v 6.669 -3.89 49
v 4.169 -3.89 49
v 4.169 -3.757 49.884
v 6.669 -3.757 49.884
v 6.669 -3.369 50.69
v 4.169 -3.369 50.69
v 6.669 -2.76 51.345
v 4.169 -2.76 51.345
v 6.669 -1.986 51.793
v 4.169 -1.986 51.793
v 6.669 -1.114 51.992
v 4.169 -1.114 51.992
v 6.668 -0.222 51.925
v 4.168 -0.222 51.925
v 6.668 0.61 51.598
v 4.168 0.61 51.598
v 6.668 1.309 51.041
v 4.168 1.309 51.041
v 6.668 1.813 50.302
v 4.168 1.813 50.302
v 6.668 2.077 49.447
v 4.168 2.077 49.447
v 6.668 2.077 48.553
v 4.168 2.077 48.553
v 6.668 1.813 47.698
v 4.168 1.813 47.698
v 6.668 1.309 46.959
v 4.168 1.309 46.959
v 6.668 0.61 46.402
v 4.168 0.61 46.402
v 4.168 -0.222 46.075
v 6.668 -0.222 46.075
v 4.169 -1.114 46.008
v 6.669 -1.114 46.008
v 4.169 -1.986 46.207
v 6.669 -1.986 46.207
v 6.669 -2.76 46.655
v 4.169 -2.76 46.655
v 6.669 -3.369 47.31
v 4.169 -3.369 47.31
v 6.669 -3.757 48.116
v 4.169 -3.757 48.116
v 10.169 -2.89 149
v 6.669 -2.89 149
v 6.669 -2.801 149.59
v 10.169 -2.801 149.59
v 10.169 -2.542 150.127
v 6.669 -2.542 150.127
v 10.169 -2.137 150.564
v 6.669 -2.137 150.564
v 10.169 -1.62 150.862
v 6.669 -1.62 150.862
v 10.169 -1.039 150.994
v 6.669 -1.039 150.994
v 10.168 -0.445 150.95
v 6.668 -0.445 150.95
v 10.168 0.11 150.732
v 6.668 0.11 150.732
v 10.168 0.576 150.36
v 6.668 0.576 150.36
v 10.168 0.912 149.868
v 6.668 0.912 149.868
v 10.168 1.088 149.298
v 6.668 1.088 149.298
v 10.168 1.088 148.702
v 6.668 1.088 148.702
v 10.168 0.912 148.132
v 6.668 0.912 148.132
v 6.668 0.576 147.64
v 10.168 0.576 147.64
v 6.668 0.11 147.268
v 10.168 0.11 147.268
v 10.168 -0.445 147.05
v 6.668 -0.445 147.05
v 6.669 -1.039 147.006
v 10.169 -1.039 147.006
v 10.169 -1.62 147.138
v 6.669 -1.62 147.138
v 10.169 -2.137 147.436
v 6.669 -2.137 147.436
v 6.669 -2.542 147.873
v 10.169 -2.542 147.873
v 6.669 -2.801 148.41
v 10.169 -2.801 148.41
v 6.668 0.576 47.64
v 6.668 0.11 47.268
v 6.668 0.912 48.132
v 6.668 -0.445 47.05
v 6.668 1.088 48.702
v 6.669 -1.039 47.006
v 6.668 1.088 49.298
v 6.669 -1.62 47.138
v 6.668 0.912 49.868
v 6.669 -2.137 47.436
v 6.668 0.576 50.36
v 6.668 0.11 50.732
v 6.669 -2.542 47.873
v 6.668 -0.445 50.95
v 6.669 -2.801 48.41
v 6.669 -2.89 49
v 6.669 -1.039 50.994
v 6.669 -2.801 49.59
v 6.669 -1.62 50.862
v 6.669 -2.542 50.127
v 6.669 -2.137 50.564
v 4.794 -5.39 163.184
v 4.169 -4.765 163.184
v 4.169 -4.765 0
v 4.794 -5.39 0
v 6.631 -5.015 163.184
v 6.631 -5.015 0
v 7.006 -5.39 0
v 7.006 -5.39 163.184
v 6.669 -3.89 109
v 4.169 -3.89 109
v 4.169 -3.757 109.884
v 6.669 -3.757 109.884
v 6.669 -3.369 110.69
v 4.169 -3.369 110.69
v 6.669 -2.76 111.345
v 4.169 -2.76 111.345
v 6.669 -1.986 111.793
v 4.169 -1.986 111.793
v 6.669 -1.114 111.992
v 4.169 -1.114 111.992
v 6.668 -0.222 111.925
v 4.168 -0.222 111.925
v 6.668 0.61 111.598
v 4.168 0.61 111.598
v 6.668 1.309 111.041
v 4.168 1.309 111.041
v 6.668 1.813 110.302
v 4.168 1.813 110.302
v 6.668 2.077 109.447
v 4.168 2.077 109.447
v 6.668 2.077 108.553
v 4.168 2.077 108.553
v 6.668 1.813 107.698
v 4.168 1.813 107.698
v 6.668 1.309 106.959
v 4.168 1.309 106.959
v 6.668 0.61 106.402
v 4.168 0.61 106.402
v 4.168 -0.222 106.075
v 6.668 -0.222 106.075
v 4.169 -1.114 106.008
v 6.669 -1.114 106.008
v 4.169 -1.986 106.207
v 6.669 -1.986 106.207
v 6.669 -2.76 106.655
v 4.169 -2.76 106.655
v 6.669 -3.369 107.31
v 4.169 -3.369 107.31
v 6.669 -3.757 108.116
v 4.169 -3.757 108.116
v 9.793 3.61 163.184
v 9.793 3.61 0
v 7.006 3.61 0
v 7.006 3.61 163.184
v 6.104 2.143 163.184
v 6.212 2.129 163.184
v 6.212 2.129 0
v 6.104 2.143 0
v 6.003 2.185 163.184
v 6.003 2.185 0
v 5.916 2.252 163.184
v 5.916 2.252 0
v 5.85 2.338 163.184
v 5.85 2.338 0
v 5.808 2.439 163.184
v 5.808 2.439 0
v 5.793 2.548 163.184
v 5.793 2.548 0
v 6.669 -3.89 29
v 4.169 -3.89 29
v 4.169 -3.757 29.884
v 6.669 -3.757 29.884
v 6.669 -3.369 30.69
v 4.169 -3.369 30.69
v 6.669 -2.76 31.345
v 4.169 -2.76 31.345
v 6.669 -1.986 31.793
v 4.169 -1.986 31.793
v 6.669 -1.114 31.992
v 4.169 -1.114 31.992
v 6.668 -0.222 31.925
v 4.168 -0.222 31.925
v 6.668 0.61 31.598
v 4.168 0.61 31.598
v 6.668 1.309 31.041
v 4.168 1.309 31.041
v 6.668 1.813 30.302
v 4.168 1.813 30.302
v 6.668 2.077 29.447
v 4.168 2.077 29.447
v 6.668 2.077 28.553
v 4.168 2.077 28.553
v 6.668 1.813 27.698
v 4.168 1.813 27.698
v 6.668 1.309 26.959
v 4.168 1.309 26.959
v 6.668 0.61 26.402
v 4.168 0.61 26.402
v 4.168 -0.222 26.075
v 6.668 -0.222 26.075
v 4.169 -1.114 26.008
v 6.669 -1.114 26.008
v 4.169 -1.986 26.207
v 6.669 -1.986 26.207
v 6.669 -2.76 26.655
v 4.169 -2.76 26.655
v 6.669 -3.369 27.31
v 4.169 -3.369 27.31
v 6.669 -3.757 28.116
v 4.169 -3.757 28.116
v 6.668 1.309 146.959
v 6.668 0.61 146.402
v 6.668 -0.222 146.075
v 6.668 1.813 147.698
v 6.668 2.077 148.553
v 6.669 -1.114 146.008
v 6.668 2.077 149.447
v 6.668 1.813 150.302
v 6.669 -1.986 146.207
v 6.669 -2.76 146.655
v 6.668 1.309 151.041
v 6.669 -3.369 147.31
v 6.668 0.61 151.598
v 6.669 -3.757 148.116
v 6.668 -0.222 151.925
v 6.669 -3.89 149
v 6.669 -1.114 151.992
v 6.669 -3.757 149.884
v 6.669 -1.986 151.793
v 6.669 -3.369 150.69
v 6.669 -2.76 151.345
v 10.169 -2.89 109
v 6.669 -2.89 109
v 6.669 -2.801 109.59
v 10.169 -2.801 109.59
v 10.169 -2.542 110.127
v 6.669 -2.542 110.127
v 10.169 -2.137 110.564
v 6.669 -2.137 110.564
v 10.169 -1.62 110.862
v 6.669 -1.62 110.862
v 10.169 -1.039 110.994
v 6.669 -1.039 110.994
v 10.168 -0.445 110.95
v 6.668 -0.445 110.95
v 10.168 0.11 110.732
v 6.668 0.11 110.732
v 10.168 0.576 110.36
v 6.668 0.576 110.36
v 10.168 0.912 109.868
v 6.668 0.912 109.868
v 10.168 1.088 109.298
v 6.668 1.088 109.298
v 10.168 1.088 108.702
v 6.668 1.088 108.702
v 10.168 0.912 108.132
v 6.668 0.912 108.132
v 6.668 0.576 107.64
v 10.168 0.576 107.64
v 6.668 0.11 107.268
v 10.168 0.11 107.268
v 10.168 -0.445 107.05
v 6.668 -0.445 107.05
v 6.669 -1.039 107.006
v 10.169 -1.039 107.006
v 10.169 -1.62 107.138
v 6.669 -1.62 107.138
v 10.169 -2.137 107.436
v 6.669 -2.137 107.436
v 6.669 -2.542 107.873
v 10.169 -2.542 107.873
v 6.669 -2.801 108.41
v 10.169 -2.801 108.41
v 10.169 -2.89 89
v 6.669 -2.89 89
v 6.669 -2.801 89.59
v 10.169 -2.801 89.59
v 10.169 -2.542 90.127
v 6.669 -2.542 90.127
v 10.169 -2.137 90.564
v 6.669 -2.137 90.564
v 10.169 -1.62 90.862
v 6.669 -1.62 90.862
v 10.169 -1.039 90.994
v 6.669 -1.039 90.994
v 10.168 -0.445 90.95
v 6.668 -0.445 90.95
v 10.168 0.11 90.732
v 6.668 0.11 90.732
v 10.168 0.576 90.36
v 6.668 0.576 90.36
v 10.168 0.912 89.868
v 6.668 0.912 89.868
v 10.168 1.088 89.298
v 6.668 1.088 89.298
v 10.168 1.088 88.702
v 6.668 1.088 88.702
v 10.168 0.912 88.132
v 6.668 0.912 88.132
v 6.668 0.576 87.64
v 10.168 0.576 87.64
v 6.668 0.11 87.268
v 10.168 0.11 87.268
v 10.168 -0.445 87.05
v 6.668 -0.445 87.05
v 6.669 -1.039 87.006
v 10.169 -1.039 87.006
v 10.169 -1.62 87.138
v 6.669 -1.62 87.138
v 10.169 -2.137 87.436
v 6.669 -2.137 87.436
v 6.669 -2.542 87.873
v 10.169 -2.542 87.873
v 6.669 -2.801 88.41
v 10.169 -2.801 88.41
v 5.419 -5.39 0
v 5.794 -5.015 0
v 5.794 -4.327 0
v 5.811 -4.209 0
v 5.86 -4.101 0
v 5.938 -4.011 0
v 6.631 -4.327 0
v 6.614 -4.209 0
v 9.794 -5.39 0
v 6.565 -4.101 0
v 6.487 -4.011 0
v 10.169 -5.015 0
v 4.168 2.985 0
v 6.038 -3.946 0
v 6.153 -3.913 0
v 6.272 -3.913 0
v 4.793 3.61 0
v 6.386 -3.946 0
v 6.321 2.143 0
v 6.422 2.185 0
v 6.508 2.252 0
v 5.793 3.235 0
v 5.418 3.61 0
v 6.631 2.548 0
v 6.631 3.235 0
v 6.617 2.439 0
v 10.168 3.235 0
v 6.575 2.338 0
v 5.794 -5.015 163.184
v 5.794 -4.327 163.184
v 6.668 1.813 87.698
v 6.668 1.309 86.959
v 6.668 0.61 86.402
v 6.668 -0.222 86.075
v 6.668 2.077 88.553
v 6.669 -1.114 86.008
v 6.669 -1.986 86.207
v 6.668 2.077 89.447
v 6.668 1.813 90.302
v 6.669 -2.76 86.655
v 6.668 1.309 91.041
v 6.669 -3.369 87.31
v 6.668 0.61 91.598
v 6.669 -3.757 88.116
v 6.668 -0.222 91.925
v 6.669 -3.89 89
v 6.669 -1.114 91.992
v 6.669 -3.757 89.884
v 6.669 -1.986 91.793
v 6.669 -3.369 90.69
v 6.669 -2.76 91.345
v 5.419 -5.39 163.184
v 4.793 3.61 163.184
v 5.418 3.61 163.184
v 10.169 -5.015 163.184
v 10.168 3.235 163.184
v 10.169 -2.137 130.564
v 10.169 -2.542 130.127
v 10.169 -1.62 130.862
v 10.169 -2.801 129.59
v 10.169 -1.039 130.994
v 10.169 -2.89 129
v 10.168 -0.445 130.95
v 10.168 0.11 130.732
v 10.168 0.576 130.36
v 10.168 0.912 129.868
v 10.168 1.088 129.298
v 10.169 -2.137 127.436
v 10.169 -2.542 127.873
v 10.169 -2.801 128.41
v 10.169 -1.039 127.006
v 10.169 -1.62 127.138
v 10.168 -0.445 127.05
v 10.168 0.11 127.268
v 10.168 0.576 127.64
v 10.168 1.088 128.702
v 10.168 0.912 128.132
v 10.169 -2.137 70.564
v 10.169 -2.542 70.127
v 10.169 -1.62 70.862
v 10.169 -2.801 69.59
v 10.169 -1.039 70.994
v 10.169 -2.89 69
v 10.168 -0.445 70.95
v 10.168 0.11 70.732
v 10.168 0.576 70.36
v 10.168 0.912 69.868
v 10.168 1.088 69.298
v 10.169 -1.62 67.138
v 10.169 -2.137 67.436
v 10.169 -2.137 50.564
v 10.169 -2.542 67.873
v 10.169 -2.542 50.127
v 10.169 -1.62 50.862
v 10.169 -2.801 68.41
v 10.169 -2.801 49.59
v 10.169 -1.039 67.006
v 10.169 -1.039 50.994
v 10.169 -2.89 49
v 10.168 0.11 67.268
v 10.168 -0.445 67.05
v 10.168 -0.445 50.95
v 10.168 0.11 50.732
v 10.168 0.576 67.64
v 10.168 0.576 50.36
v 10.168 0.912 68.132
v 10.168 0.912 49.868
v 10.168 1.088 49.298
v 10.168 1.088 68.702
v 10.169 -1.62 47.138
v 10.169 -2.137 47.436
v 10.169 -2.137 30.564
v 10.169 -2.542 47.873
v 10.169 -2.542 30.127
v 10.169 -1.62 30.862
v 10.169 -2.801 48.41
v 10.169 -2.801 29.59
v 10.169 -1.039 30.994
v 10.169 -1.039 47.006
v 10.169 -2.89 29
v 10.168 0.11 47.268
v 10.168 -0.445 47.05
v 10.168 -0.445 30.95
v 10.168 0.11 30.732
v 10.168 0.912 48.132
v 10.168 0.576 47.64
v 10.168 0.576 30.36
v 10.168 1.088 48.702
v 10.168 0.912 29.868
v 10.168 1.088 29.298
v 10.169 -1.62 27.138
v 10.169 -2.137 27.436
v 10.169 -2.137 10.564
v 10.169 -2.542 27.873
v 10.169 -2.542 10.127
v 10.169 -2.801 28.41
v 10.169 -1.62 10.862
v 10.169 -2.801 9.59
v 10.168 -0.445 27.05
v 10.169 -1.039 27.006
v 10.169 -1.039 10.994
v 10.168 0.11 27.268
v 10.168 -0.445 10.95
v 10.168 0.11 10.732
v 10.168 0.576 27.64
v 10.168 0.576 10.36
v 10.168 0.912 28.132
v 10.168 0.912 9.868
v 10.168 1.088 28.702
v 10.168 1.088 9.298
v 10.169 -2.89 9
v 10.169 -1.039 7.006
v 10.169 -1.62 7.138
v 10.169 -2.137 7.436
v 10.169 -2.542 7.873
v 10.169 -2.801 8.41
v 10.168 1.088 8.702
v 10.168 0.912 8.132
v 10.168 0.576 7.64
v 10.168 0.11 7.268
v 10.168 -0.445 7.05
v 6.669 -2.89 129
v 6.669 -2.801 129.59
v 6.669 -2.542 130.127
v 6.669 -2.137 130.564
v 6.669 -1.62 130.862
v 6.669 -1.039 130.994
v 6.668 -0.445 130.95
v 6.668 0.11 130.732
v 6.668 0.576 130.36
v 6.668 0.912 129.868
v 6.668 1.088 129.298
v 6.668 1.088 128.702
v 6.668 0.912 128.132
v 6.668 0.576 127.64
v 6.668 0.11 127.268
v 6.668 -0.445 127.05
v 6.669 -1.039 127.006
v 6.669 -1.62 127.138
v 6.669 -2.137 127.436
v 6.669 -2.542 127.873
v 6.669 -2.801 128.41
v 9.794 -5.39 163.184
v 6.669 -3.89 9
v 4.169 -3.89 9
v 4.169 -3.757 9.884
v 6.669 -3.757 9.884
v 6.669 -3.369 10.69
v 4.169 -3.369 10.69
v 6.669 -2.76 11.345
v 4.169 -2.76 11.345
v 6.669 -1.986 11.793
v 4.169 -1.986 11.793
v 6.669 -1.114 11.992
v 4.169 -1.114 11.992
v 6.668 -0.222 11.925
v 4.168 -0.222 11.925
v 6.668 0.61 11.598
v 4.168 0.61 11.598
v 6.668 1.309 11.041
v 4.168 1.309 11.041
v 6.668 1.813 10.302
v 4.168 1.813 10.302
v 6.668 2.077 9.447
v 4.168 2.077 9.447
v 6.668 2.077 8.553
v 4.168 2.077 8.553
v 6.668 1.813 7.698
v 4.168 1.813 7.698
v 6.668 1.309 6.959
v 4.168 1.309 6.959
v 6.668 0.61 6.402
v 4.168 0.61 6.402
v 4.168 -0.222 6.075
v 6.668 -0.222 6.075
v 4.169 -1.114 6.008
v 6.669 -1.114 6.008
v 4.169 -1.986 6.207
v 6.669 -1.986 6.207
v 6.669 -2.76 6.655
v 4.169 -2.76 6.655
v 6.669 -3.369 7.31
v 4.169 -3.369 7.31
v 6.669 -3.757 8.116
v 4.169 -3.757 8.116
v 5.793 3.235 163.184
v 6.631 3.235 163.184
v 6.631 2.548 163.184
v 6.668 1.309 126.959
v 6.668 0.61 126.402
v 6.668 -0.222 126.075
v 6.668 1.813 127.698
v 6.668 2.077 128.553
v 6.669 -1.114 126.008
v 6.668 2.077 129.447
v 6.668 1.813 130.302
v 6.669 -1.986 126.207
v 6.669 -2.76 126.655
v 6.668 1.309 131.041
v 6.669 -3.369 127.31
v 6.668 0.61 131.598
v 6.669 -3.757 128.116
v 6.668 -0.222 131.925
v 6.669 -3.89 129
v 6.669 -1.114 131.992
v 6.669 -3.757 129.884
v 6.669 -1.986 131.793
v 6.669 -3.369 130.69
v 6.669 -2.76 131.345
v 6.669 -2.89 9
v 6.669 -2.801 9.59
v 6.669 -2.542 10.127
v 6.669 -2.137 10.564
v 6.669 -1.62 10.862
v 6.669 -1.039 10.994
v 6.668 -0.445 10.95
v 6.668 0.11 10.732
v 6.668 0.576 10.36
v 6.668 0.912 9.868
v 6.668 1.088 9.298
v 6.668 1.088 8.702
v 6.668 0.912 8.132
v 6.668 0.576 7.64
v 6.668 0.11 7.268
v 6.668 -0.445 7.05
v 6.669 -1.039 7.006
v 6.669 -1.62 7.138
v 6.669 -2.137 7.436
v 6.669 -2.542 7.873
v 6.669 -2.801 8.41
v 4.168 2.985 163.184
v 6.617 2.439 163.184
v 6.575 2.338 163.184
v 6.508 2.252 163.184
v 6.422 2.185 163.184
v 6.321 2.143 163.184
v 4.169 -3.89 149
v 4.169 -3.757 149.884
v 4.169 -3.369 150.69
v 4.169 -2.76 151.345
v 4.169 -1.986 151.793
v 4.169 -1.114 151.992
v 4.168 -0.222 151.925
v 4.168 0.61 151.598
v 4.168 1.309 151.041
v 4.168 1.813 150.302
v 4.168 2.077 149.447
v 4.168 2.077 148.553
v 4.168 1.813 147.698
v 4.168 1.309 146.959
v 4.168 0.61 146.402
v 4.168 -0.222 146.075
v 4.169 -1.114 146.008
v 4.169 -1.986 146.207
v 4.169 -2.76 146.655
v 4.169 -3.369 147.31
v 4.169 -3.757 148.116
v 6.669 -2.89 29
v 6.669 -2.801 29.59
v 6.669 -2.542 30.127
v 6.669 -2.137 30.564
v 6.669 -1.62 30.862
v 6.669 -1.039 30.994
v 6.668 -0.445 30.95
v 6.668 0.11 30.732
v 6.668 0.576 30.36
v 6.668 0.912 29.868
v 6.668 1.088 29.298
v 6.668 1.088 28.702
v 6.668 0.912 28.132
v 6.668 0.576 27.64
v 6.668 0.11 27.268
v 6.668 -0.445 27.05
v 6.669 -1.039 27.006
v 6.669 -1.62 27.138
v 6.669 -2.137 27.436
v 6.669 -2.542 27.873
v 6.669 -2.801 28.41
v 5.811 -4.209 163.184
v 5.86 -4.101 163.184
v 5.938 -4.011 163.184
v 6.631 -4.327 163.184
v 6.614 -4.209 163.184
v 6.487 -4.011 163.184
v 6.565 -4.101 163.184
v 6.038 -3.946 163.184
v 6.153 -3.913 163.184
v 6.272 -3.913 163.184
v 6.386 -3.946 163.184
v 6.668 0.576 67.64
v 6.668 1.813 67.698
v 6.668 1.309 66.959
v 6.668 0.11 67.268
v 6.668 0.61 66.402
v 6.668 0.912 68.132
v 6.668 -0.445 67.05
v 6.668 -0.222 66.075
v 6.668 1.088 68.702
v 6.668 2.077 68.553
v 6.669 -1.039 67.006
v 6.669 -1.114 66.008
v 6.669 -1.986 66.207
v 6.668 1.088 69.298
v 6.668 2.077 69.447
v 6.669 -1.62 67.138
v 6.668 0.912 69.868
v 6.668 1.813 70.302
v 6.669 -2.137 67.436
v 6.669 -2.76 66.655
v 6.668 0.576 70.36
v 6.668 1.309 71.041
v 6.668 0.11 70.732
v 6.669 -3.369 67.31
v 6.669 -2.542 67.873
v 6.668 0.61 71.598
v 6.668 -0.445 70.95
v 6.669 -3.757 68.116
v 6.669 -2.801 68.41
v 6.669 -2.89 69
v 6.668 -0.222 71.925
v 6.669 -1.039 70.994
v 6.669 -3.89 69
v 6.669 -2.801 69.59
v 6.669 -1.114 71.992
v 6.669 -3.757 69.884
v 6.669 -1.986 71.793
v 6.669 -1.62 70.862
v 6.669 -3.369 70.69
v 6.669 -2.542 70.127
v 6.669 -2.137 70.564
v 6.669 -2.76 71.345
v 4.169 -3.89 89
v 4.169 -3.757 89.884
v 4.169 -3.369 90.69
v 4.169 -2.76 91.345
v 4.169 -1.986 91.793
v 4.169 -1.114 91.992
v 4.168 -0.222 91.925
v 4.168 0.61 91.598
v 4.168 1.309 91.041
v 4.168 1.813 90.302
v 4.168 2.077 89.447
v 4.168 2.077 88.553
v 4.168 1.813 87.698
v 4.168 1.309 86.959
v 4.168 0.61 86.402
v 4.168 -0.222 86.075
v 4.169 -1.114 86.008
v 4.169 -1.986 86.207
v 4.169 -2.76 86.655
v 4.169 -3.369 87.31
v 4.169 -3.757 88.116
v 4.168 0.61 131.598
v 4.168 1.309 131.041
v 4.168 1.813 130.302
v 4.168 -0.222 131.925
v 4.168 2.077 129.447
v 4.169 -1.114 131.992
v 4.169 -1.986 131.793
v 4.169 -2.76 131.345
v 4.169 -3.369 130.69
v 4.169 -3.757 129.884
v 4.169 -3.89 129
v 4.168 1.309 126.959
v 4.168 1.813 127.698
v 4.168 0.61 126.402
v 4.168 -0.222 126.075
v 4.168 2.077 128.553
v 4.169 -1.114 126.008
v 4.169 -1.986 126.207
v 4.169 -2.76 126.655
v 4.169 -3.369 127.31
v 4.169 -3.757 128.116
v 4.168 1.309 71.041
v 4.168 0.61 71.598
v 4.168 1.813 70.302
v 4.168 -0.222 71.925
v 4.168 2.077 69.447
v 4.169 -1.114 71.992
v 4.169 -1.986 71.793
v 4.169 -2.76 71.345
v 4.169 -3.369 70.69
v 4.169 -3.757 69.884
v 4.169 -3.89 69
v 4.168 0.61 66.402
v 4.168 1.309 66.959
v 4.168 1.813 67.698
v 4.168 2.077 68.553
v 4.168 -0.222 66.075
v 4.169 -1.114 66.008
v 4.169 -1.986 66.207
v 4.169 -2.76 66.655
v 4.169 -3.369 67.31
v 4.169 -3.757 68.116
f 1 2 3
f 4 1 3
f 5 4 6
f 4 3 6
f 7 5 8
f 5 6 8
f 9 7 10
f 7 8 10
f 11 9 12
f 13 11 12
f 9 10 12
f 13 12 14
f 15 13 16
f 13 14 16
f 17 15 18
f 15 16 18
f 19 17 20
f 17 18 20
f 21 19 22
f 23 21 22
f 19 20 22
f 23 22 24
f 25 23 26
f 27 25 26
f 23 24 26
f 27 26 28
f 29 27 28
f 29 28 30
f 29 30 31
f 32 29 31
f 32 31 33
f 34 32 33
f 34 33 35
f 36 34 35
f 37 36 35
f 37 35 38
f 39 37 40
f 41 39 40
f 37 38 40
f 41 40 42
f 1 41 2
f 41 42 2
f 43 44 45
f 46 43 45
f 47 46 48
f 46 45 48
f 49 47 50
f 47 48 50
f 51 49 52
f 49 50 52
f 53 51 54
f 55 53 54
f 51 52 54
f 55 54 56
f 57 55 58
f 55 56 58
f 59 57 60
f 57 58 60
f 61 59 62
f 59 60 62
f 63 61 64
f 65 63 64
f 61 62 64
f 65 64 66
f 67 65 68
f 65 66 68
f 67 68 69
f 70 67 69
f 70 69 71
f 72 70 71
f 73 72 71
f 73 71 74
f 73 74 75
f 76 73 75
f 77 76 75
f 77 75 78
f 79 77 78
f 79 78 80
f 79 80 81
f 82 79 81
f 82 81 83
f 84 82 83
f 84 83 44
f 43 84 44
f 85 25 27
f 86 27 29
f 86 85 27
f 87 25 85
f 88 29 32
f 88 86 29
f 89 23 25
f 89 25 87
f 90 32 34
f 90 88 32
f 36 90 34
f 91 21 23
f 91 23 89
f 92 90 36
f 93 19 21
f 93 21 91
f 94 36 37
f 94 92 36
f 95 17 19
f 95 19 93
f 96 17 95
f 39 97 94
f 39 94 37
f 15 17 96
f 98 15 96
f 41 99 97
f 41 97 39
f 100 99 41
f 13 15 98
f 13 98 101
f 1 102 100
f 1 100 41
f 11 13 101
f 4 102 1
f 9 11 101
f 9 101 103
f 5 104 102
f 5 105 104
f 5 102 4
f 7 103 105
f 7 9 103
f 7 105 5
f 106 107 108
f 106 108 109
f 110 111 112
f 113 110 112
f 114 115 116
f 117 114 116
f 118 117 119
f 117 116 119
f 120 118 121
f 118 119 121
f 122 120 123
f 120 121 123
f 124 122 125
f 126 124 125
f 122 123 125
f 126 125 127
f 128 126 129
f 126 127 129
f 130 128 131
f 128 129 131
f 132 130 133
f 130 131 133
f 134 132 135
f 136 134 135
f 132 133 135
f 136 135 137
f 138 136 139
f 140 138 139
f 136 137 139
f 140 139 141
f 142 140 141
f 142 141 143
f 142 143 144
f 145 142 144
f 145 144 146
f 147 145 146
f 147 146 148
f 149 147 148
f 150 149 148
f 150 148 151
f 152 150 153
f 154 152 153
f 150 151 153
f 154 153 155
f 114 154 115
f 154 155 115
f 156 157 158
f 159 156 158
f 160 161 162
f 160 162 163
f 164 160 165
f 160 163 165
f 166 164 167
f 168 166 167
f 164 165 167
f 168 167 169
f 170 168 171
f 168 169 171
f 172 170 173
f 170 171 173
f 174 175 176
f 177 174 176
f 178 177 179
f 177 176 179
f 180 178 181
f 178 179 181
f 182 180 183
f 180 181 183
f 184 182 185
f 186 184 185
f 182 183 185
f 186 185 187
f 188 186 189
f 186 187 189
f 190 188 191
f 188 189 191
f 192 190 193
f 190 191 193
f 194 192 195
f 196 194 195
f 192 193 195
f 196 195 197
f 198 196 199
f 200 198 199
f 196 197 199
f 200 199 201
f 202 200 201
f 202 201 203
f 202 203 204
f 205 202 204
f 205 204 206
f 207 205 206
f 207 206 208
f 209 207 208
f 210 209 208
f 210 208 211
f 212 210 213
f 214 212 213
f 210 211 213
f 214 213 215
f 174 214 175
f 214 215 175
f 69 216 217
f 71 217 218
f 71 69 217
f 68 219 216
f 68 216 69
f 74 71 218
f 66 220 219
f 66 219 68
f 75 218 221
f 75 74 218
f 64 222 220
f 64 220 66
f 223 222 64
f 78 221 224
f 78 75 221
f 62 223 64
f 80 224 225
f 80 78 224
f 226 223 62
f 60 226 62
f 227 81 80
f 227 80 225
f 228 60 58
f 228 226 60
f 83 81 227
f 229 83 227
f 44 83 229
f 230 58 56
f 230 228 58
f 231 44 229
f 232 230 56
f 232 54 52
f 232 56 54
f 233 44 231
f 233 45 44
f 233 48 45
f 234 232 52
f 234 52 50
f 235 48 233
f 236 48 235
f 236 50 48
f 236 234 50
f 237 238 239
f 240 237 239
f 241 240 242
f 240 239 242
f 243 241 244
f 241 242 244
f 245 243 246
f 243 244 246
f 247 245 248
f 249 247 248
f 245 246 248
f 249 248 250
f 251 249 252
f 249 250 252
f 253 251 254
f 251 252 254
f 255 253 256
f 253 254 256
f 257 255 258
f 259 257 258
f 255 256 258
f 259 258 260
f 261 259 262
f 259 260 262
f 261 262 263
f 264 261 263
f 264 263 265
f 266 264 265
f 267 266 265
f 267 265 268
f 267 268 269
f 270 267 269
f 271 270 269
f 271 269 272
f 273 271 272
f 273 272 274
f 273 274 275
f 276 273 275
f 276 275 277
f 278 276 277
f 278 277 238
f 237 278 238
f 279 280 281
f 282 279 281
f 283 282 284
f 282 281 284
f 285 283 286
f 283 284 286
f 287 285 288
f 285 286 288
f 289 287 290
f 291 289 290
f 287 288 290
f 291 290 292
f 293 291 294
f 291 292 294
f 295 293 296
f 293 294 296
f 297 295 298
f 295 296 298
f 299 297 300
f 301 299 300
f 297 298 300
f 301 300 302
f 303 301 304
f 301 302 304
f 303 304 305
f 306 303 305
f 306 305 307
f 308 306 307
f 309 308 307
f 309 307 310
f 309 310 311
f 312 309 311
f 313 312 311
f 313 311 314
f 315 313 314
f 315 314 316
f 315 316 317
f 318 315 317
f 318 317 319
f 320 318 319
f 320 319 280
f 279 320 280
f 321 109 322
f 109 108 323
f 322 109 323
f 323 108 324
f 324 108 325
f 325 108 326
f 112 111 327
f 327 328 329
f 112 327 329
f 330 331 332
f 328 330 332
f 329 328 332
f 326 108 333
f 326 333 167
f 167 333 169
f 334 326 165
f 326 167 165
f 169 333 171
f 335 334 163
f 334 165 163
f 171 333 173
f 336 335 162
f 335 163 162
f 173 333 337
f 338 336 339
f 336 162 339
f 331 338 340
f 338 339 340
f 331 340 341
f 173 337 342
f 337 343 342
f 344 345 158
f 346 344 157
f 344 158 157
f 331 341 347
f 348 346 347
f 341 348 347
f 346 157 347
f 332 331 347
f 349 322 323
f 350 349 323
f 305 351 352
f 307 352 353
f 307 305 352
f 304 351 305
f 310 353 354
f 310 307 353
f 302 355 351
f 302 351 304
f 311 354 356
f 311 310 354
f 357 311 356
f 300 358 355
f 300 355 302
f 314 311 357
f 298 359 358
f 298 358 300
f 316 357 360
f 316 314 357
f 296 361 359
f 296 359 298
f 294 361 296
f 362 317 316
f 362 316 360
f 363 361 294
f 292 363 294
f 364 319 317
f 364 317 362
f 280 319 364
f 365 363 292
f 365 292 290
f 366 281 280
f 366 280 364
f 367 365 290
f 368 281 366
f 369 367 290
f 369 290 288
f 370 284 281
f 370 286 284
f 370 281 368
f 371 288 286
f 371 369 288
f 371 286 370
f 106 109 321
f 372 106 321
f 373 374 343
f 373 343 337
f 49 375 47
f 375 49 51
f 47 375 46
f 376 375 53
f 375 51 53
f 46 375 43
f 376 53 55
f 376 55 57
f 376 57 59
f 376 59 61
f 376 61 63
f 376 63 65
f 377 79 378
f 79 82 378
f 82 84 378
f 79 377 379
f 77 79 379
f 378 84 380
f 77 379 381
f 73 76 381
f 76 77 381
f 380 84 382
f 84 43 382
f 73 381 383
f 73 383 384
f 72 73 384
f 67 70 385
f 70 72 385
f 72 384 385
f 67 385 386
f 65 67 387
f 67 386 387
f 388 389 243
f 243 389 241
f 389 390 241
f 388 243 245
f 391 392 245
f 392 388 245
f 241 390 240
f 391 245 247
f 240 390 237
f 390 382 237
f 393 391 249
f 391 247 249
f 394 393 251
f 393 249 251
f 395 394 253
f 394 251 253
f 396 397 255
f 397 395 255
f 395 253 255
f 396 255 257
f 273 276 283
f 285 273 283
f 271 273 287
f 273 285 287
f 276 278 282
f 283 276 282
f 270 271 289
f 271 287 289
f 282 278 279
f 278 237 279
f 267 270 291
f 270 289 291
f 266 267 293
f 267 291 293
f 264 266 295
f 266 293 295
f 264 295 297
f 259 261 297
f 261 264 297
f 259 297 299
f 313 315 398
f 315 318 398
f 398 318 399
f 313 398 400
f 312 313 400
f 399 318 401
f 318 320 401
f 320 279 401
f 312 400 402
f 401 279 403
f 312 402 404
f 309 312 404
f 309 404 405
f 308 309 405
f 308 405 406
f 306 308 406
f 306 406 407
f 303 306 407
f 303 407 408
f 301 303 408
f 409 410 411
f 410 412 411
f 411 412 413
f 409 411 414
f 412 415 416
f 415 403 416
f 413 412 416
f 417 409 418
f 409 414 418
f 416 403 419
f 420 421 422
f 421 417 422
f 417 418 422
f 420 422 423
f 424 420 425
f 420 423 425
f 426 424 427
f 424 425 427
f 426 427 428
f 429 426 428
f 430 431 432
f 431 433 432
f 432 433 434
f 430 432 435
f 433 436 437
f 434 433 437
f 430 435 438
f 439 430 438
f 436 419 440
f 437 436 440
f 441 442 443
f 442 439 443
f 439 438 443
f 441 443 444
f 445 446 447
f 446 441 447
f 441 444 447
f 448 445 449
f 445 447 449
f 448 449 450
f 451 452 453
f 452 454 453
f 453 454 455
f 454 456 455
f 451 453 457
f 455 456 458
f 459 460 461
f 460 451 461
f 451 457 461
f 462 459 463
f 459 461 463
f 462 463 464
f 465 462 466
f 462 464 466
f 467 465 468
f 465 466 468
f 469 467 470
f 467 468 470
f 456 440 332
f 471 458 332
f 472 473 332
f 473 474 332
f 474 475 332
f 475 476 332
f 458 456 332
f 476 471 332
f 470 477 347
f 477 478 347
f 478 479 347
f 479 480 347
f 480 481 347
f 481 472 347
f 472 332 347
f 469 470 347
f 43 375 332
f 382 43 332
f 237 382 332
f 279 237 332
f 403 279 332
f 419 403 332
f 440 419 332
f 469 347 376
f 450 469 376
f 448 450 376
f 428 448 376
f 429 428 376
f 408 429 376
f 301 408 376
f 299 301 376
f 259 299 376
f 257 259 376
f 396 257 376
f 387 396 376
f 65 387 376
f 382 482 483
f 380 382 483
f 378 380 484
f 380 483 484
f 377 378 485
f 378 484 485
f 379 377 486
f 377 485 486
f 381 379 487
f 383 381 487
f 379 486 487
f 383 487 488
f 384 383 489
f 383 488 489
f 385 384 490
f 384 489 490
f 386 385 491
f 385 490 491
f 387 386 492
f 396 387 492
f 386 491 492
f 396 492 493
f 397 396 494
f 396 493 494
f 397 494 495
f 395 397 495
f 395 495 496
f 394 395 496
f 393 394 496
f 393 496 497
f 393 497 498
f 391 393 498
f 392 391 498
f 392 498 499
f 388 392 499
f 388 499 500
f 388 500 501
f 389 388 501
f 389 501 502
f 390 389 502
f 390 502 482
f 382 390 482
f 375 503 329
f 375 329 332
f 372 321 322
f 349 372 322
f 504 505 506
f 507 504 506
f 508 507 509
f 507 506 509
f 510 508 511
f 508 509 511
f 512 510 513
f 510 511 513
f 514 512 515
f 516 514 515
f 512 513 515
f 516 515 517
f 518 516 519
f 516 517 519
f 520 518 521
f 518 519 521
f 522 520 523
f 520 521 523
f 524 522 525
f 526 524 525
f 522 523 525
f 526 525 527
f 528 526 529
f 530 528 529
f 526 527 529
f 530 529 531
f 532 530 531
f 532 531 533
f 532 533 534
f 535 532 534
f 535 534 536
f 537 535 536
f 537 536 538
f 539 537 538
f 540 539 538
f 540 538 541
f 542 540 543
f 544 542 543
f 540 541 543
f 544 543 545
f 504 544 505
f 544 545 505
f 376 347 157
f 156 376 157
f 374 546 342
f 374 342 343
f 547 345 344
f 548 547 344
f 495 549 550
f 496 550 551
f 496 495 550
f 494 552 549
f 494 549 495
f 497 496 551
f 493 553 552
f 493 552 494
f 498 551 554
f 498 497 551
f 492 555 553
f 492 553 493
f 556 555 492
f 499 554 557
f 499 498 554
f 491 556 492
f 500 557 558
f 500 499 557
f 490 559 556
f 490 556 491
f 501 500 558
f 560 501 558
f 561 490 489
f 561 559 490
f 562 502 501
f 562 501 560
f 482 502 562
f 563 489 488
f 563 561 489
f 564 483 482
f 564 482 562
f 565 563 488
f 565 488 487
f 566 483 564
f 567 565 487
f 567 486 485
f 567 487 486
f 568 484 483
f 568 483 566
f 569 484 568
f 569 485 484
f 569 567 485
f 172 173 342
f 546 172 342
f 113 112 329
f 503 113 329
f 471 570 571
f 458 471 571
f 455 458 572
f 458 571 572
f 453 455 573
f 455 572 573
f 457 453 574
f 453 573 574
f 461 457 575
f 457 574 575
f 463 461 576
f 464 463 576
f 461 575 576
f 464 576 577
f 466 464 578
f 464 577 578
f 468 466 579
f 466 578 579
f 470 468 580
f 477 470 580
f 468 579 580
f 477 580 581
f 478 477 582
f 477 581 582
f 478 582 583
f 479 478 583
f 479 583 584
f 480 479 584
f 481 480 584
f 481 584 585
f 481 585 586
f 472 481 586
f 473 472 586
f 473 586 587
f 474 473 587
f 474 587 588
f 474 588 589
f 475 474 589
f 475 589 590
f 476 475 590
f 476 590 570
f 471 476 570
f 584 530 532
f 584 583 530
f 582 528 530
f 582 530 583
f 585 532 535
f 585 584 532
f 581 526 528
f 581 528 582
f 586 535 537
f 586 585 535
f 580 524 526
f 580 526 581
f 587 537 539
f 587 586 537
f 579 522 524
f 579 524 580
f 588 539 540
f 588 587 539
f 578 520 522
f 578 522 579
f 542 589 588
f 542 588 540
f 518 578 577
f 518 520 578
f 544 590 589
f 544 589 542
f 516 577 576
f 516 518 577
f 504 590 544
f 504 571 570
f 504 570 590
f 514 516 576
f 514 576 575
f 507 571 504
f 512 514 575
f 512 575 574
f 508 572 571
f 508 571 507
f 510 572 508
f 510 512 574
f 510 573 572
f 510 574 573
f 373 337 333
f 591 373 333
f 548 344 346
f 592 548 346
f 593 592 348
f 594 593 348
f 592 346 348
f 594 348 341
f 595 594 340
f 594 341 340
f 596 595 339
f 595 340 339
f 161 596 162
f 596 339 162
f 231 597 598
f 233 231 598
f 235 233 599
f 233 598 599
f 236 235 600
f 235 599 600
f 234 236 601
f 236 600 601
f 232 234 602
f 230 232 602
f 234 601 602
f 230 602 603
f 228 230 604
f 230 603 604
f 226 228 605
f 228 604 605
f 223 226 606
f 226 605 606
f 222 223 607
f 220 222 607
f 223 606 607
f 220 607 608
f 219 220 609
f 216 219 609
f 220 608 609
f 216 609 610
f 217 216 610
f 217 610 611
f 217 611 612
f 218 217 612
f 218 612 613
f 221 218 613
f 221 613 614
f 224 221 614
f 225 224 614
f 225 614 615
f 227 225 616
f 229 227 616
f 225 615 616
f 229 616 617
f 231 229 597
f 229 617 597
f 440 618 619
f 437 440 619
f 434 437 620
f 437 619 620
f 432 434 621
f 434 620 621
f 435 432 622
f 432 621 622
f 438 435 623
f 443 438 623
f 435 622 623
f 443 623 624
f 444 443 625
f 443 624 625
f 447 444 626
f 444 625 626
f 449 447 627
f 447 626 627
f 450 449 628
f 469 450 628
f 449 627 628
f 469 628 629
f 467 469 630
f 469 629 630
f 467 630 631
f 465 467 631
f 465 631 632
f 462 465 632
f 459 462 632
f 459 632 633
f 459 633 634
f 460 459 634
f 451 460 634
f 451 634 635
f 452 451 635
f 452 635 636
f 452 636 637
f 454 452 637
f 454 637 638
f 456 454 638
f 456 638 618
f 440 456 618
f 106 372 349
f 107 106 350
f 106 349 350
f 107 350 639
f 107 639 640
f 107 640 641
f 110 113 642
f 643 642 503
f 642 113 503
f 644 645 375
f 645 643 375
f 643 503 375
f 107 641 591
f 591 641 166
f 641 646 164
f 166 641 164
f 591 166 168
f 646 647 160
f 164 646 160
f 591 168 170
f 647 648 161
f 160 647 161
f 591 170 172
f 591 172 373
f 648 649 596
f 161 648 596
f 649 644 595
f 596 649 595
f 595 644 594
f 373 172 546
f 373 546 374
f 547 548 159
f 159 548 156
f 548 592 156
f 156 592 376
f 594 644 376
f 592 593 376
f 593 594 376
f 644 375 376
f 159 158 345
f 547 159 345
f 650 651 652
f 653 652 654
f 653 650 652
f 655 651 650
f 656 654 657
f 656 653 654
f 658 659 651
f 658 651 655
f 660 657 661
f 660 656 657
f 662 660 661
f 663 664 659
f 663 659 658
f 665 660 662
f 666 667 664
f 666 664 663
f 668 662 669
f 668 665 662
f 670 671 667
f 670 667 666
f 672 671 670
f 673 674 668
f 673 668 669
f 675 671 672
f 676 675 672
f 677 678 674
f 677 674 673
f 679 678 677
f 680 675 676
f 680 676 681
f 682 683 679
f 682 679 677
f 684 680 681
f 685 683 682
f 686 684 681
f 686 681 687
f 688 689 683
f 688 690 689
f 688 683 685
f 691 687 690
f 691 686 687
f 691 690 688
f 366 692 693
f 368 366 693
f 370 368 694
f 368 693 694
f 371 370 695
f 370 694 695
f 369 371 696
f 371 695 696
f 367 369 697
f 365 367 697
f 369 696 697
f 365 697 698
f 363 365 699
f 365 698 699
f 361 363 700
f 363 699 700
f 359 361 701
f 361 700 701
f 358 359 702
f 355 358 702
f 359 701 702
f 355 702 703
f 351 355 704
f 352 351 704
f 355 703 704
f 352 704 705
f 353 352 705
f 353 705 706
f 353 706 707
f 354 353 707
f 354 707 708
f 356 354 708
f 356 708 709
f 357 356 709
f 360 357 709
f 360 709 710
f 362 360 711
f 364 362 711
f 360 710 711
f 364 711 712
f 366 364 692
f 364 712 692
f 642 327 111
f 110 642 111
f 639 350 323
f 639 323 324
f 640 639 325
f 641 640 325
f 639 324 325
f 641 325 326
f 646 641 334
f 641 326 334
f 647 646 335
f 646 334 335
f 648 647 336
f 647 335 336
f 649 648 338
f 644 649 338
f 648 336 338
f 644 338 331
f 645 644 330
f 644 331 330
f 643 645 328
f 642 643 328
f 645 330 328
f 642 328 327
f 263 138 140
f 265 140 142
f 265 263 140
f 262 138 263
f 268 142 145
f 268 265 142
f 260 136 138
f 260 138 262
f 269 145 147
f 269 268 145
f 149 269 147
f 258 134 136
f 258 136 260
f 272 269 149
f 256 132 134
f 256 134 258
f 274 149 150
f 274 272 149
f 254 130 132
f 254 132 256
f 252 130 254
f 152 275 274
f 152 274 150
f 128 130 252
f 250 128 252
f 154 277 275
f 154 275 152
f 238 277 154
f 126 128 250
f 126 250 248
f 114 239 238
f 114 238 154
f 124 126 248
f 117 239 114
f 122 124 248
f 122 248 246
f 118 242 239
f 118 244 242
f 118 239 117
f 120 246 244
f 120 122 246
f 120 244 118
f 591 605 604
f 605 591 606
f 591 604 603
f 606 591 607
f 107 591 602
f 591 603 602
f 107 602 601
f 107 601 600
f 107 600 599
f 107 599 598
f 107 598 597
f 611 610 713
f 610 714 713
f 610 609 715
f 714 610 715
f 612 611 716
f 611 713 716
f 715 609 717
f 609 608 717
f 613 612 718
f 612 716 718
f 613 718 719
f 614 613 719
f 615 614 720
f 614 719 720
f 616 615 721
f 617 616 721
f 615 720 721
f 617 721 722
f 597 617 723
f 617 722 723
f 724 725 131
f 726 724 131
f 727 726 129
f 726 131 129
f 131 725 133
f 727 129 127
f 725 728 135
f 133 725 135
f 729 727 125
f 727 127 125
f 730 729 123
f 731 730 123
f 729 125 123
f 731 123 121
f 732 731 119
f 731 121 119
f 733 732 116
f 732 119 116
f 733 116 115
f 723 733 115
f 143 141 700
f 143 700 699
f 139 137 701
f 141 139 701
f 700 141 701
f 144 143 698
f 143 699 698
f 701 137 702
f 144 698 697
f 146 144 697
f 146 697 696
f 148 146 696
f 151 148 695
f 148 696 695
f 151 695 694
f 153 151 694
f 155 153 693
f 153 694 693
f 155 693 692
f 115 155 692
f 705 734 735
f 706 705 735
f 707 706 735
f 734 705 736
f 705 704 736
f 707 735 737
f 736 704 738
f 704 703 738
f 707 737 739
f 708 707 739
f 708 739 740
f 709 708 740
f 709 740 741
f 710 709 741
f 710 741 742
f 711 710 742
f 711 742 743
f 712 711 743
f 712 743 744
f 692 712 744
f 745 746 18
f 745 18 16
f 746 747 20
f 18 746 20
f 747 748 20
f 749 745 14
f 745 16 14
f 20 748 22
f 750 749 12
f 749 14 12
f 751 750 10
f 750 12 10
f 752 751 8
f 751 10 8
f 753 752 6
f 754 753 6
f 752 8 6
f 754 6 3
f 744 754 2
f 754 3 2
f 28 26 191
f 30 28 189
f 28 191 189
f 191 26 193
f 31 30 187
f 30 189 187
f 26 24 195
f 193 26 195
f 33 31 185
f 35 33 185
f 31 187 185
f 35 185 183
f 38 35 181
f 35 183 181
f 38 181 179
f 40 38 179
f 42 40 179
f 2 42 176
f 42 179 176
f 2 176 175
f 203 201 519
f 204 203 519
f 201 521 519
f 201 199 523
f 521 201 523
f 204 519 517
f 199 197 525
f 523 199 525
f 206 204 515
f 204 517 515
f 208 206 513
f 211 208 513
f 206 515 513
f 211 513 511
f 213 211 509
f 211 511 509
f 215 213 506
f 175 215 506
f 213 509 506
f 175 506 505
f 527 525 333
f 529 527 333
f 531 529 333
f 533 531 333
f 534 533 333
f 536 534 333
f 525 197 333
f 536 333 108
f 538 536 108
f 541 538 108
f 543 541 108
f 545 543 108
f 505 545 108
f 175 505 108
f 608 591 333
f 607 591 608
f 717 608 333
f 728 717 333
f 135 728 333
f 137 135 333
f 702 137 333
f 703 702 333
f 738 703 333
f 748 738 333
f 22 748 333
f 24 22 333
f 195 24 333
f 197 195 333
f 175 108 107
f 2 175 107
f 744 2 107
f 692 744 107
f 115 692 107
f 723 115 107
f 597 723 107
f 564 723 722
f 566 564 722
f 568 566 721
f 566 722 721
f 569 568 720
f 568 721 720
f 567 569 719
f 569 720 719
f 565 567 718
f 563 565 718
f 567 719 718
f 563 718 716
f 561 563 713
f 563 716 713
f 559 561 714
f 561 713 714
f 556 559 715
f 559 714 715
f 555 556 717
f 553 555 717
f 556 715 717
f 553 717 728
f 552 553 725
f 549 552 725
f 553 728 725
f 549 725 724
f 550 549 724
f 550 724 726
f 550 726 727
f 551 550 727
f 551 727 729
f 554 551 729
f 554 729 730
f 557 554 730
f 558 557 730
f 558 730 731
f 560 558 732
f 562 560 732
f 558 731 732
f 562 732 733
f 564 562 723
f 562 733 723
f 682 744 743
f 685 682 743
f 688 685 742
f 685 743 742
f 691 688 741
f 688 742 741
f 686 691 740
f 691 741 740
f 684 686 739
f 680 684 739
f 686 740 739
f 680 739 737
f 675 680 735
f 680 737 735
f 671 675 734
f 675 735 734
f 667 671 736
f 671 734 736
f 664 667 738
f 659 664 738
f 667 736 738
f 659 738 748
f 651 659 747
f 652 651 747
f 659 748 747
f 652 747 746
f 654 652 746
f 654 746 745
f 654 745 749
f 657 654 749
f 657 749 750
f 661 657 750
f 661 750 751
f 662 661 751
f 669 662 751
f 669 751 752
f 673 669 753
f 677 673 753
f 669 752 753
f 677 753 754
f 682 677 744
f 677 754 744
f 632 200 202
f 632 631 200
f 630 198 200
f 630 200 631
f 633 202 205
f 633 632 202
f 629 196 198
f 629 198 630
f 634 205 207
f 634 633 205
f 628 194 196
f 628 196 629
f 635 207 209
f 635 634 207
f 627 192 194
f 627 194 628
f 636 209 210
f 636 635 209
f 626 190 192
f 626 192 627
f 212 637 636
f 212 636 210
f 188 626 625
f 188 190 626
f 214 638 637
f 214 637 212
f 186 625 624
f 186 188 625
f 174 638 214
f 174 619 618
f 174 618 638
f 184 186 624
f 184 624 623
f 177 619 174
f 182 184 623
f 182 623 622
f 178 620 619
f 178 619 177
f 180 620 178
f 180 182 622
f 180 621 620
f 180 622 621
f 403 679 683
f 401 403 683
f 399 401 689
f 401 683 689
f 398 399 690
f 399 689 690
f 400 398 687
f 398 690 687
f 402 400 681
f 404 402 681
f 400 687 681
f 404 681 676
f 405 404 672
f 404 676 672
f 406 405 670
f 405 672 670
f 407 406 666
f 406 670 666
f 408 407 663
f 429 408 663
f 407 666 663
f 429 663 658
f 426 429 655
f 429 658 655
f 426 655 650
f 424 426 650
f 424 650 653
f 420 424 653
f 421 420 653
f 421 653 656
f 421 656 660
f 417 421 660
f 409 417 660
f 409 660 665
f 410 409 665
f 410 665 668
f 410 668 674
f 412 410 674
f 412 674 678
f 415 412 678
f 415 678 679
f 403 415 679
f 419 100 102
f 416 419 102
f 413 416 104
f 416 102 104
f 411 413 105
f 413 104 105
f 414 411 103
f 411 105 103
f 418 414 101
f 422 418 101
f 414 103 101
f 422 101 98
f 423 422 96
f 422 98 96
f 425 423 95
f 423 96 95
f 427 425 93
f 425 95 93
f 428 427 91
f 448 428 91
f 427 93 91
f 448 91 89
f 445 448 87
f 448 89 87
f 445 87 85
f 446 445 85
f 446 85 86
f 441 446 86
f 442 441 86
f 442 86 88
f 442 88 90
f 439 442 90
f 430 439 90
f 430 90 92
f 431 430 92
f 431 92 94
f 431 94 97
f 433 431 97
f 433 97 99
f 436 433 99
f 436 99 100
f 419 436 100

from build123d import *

# Parameters (mm, degrees)
BOSS_EXTRUDE4_DEPTH = 200
SKETCH3_R           = 2
CUT_EXTRUDE1_DEPTH  = 200
SKETCH3_3_R         = 3
SKETCH3_3_R_2       = 2
CUT_EXTRUDE2_DEPTH  = 2.5
SKETCH4_W           = 36.815771896
SKETCH4_H           = 9
CUT_EXTRUDE3_DEPTH  = 10


with BuildPart() as part:
    # Sketch1 → Boss-Extrude4 (new body)
    with BuildSketch(Plane.XY):
        with BuildLine():
            Line((10.168613541, -5.014716436), (10.168390302, 3.235283561))
            Line((10.168390302, 3.235283561), (9.793380155, 3.610273413))
            Line((9.793380155, 3.610273413), (7.005880156, 3.610197985))
            Line((7.005880156, 3.610197985), (6.630890303, 3.235187838))
            Line((6.630890303, 3.235187838), (6.630908906, 2.547687839))
            ThreePointArc((6.630908906, 2.547687839), (6.508267883, 2.251583555), (6.212170237, 2.128926508))
            ThreePointArc((6.212170237, 2.128926508), (5.916065954, 2.251567531), (5.793408907, 2.547665177))
            Line((5.793408907, 2.547665177), (5.793390303, 3.235165176))
            Line((5.793390303, 3.235165176), (5.418380156, 3.610155029))
            Line((5.418380156, 3.610155029), (4.793380156, 3.610138117))
            Line((4.793380156, 3.610138117), (4.168397069, 2.985121205))
            Line((4.168397069, 2.985121205), (4.168606778, -4.764878792))
            Line((4.168606778, -4.764878792), (4.79362369, -5.38986188))
            Line((4.79362369, -5.38986188), (5.41862369, -5.389844968))
            Line((5.41862369, -5.389844968), (5.793613542, -5.014834821))
            Line((5.793613542, -5.014834821), (5.793594939, -4.327334821))
            ThreePointArc((5.793594939, -4.327334821), (6.212333608, -3.90857349), (6.631094939, -4.327312159))
            Line((6.631094939, -4.327312159), (6.631113542, -5.014812159))
            Line((6.631113542, -5.014812159), (7.006123689, -5.389802011))
            Line((7.006123689, -5.389802011), (9.793623688, -5.389726583))
            Line((9.793623688, -5.389726583), (10.168613541, -5.014716436))
        make_face()
    extrude(amount=BOSS_EXTRUDE4_DEPTH)

    # Sketch3 → Cut-Extrude1 (cut)
    with BuildSketch(Plane(origin=(4.168477841, 0.000112796, 0), x_dir=(0, 0, 1), z_dir=(-0.999999999633898, -2.7059269393071615e-05, 0))):
        with Locations((9, -0.88999159)):
            Circle(SKETCH3_R)
        with Locations((29, -0.88999159)):
            Circle(SKETCH3_R)
        with Locations((49, -0.88999159)):
            Circle(SKETCH3_R)
        with Locations((69, -0.88999159)):
            Circle(SKETCH3_R)
        with Locations((89, -0.88999159)):
            Circle(SKETCH3_R)
        with Locations((109, -0.88999159)):
            Circle(SKETCH3_R)
        with Locations((129, -0.88999159)):
            Circle(SKETCH3_R)
        with Locations((149, -0.88999159)):
            Circle(SKETCH3_R)
        with Locations((169, -0.88999159)):
            Circle(SKETCH3_R)
        with Locations((189, -0.88999159)):
            Circle(SKETCH3_R)
    extrude(amount=-CUT_EXTRUDE1_DEPTH, mode=Mode.SUBTRACT)

    # Sketch3<3> → Cut-Extrude2 (cut)
    # profile 1 of 10: a face of its own
    with BuildSketch(Plane(origin=(4.168477841, 0.000112796, 0), x_dir=(0, 0, 1), z_dir=(-0.999999999633898, -2.7059269393071615e-05, 0))):
        with Locations((9, -0.88999159)):
            Circle(SKETCH3_3_R)
        with Locations((9, -0.88999159)):
            Circle(SKETCH3_3_R_2, mode=Mode.SUBTRACT)
    # profile 2 of 10: a face of its own
    with BuildSketch(Plane(origin=(4.168477841, 0.000112796, 0), x_dir=(0, 0, 1), z_dir=(-0.999999999633898, -2.7059269393071615e-05, 0))):
        with Locations((29, -0.88999159)):
            Circle(SKETCH3_3_R)
        with Locations((29, -0.88999159)):
            Circle(SKETCH3_3_R_2, mode=Mode.SUBTRACT)
    # profile 3 of 10: a face of its own
    with BuildSketch(Plane(origin=(4.168477841, 0.000112796, 0), x_dir=(0, 0, 1), z_dir=(-0.999999999633898, -2.7059269393071615e-05, 0))):
        with Locations((49, -0.88999159)):
            Circle(SKETCH3_3_R)
        with Locations((49, -0.88999159)):
            Circle(SKETCH3_3_R_2, mode=Mode.SUBTRACT)
    # profile 4 of 10: a face of its own
    with BuildSketch(Plane(origin=(4.168477841, 0.000112796, 0), x_dir=(0, 0, 1), z_dir=(-0.999999999633898, -2.7059269393071615e-05, 0))):
        with Locations((69, -0.88999159)):
            Circle(SKETCH3_3_R)
        with Locations((69, -0.88999159)):
            Circle(SKETCH3_3_R_2, mode=Mode.SUBTRACT)
    # profile 5 of 10: a face of its own
    with BuildSketch(Plane(origin=(4.168477841, 0.000112796, 0), x_dir=(0, 0, 1), z_dir=(-0.999999999633898, -2.7059269393071615e-05, 0))):
        with Locations((89, -0.88999159)):
            Circle(SKETCH3_3_R)
        with Locations((89, -0.88999159)):
            Circle(SKETCH3_3_R_2, mode=Mode.SUBTRACT)
    # profile 6 of 10: a face of its own
    with BuildSketch(Plane(origin=(4.168477841, 0.000112796, 0), x_dir=(0, 0, 1), z_dir=(-0.999999999633898, -2.7059269393071615e-05, 0))):
        with Locations((109, -0.88999159)):
            Circle(SKETCH3_3_R)
    # profile 7 of 10: a face of its own
    with BuildSketch(Plane(origin=(4.168477841, 0.000112796, 0), x_dir=(0, 0, 1), z_dir=(-0.999999999633898, -2.7059269393071615e-05, 0))):
        with Locations((129, -0.88999159)):
            Circle(SKETCH3_3_R)
    # profile 8 of 10: a face of its own
    with BuildSketch(Plane(origin=(4.168477841, 0.000112796, 0), x_dir=(0, 0, 1), z_dir=(-0.999999999633898, -2.7059269393071615e-05, 0))):
        with Locations((149, -0.88999159)):
            Circle(SKETCH3_3_R)
    # profile 9 of 10: a face of its own
    with BuildSketch(Plane(origin=(4.168477841, 0.000112796, 0), x_dir=(0, 0, 1), z_dir=(-0.999999999633898, -2.7059269393071615e-05, 0))):
        with Locations((169, -0.88999159)):
            Circle(SKETCH3_3_R)
    # profile 10 of 10: a face of its own
    with BuildSketch(Plane(origin=(4.168477841, 0.000112796, 0), x_dir=(0, 0, 1), z_dir=(-0.999999999633898, -2.7059269393071615e-05, 0))):
        with Locations((189, -0.88999159)):
            Circle(SKETCH3_3_R)
    extrude(amount=-CUT_EXTRUDE2_DEPTH, mode=Mode.SUBTRACT)

    # Sketch4 → Cut-Extrude3 (cut)
    with BuildSketch(Plane(origin=(10.168477839, 0.000275152, 0), x_dir=(0, 0, -1), z_dir=(0.999999999633898, 2.7059269386201862e-05, 0))):
        with Locations((-181.592114052, -0.88999159)):
            Rectangle(SKETCH4_W, SKETCH4_H)
    extrude(amount=-CUT_EXTRUDE3_DEPTH, mode=Mode.SUBTRACT)


solid = part.part
